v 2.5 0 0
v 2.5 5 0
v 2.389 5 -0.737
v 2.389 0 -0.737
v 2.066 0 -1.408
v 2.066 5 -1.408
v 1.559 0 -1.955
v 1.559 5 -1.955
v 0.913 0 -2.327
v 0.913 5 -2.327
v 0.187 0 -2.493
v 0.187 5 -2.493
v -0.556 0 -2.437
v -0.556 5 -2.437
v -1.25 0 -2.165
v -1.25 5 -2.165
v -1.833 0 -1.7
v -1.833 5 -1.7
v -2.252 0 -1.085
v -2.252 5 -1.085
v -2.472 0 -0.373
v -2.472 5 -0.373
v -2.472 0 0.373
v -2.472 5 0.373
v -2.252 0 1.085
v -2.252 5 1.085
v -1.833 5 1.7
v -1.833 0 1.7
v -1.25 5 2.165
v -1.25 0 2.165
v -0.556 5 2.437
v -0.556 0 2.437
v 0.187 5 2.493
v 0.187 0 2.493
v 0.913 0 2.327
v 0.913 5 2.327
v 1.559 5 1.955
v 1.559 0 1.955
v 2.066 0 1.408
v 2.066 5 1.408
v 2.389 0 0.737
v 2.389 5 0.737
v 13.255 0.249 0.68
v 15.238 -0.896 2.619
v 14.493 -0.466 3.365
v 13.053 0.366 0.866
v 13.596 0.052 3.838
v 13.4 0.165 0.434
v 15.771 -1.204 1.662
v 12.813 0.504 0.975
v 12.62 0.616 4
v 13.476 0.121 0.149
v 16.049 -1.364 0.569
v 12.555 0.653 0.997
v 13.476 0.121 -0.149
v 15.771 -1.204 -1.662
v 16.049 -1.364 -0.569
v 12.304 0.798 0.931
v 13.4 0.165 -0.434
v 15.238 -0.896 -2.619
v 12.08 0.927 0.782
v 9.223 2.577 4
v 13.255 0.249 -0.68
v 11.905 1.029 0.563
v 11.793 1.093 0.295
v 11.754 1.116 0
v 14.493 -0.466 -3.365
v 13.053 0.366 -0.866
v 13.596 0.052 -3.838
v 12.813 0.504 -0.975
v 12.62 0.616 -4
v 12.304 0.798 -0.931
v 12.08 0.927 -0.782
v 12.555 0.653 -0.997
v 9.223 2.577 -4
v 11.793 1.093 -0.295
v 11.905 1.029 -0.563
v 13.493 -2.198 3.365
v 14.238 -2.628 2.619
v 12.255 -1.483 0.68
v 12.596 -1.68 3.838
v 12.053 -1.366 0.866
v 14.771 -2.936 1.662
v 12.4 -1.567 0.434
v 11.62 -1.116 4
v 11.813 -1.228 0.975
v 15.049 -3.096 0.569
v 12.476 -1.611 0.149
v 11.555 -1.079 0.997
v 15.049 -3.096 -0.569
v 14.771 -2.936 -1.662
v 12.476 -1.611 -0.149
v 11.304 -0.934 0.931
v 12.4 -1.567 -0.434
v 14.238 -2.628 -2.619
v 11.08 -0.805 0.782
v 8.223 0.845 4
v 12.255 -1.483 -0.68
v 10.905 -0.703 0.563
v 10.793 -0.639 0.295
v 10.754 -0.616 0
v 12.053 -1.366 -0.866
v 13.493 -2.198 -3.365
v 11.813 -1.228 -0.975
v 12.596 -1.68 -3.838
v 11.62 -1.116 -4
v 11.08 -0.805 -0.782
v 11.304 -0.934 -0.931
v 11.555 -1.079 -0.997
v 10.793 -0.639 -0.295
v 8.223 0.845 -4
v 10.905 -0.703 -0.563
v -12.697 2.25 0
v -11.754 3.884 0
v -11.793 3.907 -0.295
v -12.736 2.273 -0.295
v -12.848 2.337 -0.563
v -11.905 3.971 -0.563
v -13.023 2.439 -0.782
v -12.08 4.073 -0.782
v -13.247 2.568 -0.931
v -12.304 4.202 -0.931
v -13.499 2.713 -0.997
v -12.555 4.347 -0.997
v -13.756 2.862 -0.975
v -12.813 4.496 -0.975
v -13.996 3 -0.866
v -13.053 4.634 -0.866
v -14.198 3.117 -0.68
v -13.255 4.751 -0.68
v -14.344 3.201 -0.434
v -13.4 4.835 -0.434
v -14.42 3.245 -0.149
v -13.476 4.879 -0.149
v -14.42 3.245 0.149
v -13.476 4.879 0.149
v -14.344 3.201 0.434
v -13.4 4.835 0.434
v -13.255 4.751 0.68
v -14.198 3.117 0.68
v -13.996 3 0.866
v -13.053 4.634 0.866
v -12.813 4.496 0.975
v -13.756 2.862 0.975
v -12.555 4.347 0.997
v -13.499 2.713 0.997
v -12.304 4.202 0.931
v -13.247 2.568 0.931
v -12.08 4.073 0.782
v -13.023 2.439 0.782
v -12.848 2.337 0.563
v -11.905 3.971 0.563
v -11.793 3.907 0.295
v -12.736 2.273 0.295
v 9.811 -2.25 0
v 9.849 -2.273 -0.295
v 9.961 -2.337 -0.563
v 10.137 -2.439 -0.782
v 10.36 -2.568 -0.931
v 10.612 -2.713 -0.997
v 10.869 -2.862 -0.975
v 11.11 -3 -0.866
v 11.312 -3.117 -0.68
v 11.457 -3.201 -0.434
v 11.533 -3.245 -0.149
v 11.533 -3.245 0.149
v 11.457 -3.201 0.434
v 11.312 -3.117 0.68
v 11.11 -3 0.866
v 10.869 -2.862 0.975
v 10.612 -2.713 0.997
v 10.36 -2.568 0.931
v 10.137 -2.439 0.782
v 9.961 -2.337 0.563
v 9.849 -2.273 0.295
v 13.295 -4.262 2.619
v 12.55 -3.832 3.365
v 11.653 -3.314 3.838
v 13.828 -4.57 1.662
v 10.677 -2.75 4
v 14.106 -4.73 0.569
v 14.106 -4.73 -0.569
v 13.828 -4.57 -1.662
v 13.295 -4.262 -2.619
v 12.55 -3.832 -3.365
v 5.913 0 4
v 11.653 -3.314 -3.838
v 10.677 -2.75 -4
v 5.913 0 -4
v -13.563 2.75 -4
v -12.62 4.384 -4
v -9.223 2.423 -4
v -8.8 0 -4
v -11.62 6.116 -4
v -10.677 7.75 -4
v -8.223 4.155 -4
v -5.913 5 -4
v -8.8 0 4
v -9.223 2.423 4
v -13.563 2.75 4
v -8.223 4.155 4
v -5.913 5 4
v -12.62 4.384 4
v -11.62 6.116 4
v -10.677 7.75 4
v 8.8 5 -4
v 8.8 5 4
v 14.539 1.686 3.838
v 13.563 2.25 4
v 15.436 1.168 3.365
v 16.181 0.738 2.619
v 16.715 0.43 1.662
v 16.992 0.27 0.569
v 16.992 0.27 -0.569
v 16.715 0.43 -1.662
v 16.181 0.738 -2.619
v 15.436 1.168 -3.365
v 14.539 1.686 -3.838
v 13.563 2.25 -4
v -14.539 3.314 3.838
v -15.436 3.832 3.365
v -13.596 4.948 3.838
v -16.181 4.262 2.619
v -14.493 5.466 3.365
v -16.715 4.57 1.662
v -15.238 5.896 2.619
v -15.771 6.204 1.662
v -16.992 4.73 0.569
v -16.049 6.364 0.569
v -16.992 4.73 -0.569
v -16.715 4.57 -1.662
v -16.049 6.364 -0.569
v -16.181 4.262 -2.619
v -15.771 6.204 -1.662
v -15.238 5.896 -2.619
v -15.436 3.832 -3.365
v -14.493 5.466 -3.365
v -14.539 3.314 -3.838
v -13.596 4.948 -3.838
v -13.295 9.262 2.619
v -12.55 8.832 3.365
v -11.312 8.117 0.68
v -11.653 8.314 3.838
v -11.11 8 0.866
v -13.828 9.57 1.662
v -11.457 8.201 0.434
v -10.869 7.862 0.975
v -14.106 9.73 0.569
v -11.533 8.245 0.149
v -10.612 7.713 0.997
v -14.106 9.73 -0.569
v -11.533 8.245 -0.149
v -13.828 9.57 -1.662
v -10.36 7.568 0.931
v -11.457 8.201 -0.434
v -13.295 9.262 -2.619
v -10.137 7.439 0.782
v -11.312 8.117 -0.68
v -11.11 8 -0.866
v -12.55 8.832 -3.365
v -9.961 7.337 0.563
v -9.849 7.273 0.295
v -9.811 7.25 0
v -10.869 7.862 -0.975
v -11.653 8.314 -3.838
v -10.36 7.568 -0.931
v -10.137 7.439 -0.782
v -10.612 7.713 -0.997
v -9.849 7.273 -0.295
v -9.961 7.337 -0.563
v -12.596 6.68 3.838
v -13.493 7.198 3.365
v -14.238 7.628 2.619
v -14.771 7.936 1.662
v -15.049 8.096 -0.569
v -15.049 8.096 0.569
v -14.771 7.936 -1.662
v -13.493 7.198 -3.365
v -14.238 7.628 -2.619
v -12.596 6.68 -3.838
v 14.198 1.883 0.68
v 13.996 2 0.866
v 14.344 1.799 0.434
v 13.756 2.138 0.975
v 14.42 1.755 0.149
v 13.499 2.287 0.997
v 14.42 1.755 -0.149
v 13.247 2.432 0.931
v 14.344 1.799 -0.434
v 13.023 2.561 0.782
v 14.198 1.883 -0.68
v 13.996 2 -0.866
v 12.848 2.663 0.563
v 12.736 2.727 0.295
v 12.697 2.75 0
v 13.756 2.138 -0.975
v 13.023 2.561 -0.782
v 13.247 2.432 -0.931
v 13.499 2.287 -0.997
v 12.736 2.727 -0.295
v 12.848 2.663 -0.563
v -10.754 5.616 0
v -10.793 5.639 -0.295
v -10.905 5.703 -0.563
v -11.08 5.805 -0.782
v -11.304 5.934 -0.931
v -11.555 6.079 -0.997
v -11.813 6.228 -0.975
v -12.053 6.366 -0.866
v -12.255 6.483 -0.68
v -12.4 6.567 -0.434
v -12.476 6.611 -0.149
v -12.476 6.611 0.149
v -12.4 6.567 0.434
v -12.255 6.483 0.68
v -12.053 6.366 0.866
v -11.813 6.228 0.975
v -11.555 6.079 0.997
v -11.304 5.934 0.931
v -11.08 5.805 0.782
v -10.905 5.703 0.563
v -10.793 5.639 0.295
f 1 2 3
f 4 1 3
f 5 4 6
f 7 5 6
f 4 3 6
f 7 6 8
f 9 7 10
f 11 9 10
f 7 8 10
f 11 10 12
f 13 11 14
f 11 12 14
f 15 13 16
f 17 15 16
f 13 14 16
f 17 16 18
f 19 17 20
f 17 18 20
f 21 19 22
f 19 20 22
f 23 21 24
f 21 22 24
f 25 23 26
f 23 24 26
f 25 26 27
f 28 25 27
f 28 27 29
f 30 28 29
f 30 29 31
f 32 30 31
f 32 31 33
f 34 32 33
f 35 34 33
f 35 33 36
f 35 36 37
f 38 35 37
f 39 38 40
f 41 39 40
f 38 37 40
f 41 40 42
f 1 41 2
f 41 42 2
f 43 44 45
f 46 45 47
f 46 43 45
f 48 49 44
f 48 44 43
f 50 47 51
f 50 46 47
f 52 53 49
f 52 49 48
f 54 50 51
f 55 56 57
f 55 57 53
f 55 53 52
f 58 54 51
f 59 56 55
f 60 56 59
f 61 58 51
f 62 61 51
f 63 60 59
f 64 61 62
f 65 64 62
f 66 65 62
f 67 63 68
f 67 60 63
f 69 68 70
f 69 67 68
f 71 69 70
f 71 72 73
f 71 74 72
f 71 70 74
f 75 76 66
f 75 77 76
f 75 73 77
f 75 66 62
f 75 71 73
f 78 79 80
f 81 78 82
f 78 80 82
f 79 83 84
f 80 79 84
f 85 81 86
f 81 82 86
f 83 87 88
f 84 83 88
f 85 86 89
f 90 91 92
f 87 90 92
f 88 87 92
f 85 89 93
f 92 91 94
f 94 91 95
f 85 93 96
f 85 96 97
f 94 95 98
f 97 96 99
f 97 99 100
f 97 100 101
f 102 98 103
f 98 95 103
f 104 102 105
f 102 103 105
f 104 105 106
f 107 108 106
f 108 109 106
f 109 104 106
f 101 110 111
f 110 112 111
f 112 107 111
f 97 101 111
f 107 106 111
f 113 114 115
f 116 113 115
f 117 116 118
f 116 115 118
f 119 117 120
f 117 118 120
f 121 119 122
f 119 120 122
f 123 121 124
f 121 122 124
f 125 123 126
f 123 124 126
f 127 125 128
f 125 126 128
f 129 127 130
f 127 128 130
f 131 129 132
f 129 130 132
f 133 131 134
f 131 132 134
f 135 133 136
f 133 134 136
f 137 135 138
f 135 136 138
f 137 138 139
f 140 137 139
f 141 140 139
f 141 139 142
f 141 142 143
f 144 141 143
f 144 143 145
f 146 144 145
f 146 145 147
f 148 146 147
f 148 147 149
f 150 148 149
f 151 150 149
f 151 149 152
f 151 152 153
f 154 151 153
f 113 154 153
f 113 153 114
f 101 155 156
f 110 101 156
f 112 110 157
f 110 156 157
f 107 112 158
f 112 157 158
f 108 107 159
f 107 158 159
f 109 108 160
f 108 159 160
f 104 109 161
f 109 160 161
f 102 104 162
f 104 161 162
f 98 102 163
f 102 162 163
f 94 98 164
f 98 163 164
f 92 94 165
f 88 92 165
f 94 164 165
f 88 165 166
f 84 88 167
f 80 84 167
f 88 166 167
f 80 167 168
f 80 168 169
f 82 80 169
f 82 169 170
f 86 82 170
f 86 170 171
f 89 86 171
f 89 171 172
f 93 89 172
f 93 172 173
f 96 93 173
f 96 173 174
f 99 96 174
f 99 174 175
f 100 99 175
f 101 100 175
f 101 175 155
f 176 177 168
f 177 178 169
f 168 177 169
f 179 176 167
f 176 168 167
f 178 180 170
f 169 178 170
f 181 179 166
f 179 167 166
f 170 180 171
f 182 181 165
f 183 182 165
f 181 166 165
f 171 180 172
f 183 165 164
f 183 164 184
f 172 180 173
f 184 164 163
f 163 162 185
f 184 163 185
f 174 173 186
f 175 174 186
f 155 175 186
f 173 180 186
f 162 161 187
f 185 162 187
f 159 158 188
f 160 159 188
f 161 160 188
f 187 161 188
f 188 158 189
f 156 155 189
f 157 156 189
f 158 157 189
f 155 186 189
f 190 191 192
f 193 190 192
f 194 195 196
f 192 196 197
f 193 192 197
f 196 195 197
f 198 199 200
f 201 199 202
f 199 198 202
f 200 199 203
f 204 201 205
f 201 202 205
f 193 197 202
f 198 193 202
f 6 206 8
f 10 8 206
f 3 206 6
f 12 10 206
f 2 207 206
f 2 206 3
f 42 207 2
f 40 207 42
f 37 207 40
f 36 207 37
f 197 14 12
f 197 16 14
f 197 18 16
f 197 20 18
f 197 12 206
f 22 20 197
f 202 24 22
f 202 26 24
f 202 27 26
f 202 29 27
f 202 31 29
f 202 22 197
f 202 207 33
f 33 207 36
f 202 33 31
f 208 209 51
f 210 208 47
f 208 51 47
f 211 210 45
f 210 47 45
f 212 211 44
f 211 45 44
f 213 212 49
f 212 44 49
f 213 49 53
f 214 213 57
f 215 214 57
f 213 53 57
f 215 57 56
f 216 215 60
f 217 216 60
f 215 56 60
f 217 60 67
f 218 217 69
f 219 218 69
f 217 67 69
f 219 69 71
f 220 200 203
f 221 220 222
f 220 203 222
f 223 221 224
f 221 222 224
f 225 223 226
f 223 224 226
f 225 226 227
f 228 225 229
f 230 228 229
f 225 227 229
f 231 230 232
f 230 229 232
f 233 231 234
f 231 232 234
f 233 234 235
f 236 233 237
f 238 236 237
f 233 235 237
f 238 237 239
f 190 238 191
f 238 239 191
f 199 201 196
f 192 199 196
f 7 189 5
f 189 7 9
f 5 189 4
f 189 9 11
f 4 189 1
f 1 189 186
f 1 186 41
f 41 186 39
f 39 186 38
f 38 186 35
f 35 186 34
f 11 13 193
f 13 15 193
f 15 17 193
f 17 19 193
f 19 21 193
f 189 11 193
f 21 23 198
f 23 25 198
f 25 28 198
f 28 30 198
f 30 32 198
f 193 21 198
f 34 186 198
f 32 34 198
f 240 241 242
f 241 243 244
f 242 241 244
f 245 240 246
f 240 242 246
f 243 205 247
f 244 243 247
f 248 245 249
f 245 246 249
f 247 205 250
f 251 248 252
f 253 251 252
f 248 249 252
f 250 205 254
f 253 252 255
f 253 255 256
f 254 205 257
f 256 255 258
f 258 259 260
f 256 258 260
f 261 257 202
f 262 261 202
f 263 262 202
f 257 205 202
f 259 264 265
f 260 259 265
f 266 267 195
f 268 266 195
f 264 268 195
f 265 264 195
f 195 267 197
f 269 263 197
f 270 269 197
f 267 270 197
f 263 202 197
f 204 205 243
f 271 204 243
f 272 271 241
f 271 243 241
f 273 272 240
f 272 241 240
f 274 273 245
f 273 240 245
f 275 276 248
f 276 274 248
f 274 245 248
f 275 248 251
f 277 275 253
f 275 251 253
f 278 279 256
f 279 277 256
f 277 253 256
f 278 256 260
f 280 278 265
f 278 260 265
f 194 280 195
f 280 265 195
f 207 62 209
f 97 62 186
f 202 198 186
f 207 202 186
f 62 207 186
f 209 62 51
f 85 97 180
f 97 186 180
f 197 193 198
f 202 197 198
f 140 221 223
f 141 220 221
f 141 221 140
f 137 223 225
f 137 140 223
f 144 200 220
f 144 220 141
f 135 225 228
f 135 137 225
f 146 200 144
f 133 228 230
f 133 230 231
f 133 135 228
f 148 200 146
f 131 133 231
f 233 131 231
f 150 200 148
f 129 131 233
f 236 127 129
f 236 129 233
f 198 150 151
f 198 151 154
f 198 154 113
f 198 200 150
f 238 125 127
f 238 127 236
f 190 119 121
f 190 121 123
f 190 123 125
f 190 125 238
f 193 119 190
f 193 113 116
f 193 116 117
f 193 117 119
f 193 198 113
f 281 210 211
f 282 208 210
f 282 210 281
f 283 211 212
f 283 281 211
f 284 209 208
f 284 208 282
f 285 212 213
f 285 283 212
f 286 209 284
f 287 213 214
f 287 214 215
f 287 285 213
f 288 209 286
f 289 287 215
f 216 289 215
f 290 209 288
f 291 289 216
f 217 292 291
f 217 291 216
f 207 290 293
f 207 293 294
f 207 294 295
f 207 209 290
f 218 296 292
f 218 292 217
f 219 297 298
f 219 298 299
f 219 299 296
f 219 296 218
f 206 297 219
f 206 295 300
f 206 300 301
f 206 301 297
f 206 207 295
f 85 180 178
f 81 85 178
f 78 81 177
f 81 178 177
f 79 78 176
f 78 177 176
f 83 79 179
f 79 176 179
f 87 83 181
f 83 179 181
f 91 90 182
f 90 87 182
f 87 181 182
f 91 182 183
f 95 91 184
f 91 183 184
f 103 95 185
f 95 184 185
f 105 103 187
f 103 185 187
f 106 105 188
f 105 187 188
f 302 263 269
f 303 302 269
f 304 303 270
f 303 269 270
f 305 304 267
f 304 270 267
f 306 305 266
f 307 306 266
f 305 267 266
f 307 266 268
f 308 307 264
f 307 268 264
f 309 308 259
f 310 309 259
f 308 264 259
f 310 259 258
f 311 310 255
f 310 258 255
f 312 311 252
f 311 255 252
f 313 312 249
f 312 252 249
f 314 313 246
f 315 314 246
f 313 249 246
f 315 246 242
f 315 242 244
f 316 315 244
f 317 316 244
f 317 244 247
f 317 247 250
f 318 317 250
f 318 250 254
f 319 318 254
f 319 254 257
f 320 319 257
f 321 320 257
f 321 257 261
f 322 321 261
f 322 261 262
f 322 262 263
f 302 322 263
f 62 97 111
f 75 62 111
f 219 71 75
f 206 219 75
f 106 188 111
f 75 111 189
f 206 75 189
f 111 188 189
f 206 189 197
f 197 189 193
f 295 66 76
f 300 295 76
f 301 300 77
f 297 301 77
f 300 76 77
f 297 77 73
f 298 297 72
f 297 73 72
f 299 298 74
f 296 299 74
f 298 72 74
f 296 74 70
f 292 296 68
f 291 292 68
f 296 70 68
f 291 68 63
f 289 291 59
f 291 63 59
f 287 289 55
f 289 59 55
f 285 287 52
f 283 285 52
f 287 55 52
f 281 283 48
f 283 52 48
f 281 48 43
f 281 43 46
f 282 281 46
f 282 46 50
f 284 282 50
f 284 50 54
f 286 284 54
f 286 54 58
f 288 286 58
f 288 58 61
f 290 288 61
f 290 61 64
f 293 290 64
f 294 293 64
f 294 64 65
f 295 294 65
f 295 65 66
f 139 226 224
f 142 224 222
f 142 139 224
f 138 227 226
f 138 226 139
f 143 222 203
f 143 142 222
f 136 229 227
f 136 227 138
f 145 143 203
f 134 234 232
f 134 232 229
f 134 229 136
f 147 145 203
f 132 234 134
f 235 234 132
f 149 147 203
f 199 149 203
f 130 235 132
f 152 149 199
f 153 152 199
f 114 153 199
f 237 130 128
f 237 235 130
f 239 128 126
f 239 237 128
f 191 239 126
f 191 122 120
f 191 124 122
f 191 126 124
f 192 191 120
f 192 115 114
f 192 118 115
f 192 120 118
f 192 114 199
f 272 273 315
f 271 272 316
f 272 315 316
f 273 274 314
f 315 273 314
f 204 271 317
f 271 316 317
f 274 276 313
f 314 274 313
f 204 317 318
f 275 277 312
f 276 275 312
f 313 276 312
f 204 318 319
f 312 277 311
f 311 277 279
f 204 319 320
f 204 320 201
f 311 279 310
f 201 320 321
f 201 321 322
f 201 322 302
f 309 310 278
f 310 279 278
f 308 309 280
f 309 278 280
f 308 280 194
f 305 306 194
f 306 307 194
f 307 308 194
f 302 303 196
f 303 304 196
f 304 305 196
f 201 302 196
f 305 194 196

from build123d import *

# Parameters (mm, degrees)
SKETCH_2_R               = 6
EXTRUDE_1_DEPTH          = 5
SKETCH_3_R               = 2.5
CUT_EXTRUDE_1_DEPTH      = 5
SKETCH_4_W               = 5.729511979
SKETCH_4_H               = 5
EXTRUDE_2_DEPTH          = 4
SKETCH_5_W               = 17.690730237
SKETCH_5_H               = 11.693817156
CUT_EXTRUDE_3_DEPTH      = 4.5
EXTRUDE_3_DEPTH          = 5.773503
SKETCH_7_R               = 1
CUT_EXTRUDE_4_DEPTH      = 5.773503
SKETCH_9_W               = 22.757935056
SKETCH_9_H               = 15.650140619
CUT_EXTRUDE_5_DEPTH      = 1
PATTERN_CIRCULAR_3_COUNT = 2
PATTERN_CIRCULAR_4_COUNT = 2
SKETCH_10_W              = 9.588589767
SKETCH_10_H              = 4.25680111
SKETCH_10_W_2            = 8.94427191
SKETCH_10_H_2            = 4.682372666
CUT_EXTRUDE_6_DEPTH      = 10


with BuildPart() as part:
    # 草图2 → 凸台-拉伸1 (new body)
    with BuildSketch(Plane(origin=(0, 0, 0), x_dir=(1, 0, 0), z_dir=(0, 1, 0))):
        Circle(SKETCH_2_R)
    extrude(amount=EXTRUDE_1_DEPTH)

    # 草图3 → 切除-拉伸1 (cut)
    with BuildSketch(Plane(origin=(0, 5, 0), x_dir=(1, 0, 0), z_dir=(0, 1, 0))):
        Circle(SKETCH_3_R)
    extrude(amount=-CUT_EXTRUDE_1_DEPTH, mode=Mode.SUBTRACT)

    # 草图4 → 凸台-拉伸2 (add, symmetric)
    with BuildSketch(Plane.XY):
        with Locations((-5.934851886, 2.5)):
            Rectangle(SKETCH_4_W, SKETCH_4_H)
    extrude_2 = extrude(amount=EXTRUDE_2_DEPTH, both=True)

    # 草图5 → 切除-拉伸3 (cut)
    with BuildSketch(Plane(origin=(-6.599705906, 3.810341982, 0), x_dir=(0, 0, 1), z_dir=(0.866025404, -0.5, 0))):
        with Locations((1.152187915, 2.412038691)):
            Rectangle(SKETCH_5_W, SKETCH_5_H)
    cut_extrude_3 = extrude(amount=-CUT_EXTRUDE_3_DEPTH, mode=Mode.SUBTRACT)

    # 镜向1: 凸台-拉伸2 across plane
    add(extrude_2.mirror(Plane(origin=(0, 0, 0), x_dir=(0, 0, 1), z_dir=(1, 0, 0))))

    # 阵列(圆周)3: 切除-拉伸3 ×2 about axis
    pattern_circular_3_axis = Axis((0, 2.5, -6.6), (0, 0, 1))
    for i in range(1, PATTERN_CIRCULAR_3_COUNT):
        add(cut_extrude_3.rotate(pattern_circular_3_axis, i * 360 / PATTERN_CIRCULAR_3_COUNT), mode=Mode.SUBTRACT)


with BuildPart() as body_2:
    # 草图6 → 凸台-拉伸3 (new body)
    with BuildSketch(Plane(origin=(0.686849377, 1.189658018, 0), x_dir=(0, 0, 1), z_dir=(0.5, 0.866025404, 0))):
        with BuildLine():
            Line((-4, -13.121503046), (-4, -7.620683963))
            Line((-4, -7.620683963), (4, -7.620683963))
            Line((4, -7.620683963), (4, -13.121503046))
            ThreePointArc((4, -13.121503046), (0, -17.121503046), (-4, -13.121503046))
        make_face()
    extrude_3 = extrude(amount=-EXTRUDE_3_DEPTH)

    # 草图7 → 切除-拉伸4 (cut)
    with BuildSketch(Plane(origin=(0.686849377, 1.189658018, 0), x_dir=(0.866025404, -0.5, 0), z_dir=(0.5, 0.866025404, 0))):
        with Locations((-13.121503046, 0)):
            Circle(SKETCH_7_R)
    cut_extrude_4 = extrude(amount=-CUT_EXTRUDE_4_DEPTH, mode=Mode.SUBTRACT)

    # 草图9 → 切除-拉伸5 (cut, symmetric)
    with BuildSketch(Plane(origin=(-0.756526296, -1.310341982, 0), x_dir=(0.866025404, -0.5, 0), z_dir=(0.5, 0.866025404, 0))):
        with Locations((-20.577581029, 0.471972115)):
            Rectangle(SKETCH_9_W, SKETCH_9_H)
    cut_extrude_5 = extrude(amount=CUT_EXTRUDE_5_DEPTH, both=True, mode=Mode.SUBTRACT)


with BuildPart() as part_1:
    add(part.part)

    # 阵列(圆周)4: 凸台-拉伸3, 切除-拉伸4, 切除-拉伸5 ×2 about axis
    pattern_circular_4_axis = Axis((0, 2.5, 0), (0, 0, 1))
    for i in range(1, PATTERN_CIRCULAR_4_COUNT):
        add(extrude_3.rotate(pattern_circular_4_axis, i * 360 / PATTERN_CIRCULAR_4_COUNT))
        add(cut_extrude_4.rotate(pattern_circular_4_axis, i * 360 / PATTERN_CIRCULAR_4_COUNT), mode=Mode.SUBTRACT)
        add(cut_extrude_5.rotate(pattern_circular_4_axis, i * 360 / PATTERN_CIRCULAR_4_COUNT), mode=Mode.SUBTRACT)

    # 草图10 → 切除-拉伸6 (cut)
    with BuildSketch(Plane(origin=(0, 5, 0), x_dir=(1, 0, 0), z_dir=(0, 1, 0))):
        with Locations((-0.322158928, -6.128400555)):
            Rectangle(SKETCH_10_W, SKETCH_10_H)
        with Locations((0, 6.341186333)):
            Rectangle(SKETCH_10_W_2, SKETCH_10_H_2)
    extrude(amount=-CUT_EXTRUDE_6_DEPTH, mode=Mode.SUBTRACT)


solid = Compound([body_2.part, part_1.part])
